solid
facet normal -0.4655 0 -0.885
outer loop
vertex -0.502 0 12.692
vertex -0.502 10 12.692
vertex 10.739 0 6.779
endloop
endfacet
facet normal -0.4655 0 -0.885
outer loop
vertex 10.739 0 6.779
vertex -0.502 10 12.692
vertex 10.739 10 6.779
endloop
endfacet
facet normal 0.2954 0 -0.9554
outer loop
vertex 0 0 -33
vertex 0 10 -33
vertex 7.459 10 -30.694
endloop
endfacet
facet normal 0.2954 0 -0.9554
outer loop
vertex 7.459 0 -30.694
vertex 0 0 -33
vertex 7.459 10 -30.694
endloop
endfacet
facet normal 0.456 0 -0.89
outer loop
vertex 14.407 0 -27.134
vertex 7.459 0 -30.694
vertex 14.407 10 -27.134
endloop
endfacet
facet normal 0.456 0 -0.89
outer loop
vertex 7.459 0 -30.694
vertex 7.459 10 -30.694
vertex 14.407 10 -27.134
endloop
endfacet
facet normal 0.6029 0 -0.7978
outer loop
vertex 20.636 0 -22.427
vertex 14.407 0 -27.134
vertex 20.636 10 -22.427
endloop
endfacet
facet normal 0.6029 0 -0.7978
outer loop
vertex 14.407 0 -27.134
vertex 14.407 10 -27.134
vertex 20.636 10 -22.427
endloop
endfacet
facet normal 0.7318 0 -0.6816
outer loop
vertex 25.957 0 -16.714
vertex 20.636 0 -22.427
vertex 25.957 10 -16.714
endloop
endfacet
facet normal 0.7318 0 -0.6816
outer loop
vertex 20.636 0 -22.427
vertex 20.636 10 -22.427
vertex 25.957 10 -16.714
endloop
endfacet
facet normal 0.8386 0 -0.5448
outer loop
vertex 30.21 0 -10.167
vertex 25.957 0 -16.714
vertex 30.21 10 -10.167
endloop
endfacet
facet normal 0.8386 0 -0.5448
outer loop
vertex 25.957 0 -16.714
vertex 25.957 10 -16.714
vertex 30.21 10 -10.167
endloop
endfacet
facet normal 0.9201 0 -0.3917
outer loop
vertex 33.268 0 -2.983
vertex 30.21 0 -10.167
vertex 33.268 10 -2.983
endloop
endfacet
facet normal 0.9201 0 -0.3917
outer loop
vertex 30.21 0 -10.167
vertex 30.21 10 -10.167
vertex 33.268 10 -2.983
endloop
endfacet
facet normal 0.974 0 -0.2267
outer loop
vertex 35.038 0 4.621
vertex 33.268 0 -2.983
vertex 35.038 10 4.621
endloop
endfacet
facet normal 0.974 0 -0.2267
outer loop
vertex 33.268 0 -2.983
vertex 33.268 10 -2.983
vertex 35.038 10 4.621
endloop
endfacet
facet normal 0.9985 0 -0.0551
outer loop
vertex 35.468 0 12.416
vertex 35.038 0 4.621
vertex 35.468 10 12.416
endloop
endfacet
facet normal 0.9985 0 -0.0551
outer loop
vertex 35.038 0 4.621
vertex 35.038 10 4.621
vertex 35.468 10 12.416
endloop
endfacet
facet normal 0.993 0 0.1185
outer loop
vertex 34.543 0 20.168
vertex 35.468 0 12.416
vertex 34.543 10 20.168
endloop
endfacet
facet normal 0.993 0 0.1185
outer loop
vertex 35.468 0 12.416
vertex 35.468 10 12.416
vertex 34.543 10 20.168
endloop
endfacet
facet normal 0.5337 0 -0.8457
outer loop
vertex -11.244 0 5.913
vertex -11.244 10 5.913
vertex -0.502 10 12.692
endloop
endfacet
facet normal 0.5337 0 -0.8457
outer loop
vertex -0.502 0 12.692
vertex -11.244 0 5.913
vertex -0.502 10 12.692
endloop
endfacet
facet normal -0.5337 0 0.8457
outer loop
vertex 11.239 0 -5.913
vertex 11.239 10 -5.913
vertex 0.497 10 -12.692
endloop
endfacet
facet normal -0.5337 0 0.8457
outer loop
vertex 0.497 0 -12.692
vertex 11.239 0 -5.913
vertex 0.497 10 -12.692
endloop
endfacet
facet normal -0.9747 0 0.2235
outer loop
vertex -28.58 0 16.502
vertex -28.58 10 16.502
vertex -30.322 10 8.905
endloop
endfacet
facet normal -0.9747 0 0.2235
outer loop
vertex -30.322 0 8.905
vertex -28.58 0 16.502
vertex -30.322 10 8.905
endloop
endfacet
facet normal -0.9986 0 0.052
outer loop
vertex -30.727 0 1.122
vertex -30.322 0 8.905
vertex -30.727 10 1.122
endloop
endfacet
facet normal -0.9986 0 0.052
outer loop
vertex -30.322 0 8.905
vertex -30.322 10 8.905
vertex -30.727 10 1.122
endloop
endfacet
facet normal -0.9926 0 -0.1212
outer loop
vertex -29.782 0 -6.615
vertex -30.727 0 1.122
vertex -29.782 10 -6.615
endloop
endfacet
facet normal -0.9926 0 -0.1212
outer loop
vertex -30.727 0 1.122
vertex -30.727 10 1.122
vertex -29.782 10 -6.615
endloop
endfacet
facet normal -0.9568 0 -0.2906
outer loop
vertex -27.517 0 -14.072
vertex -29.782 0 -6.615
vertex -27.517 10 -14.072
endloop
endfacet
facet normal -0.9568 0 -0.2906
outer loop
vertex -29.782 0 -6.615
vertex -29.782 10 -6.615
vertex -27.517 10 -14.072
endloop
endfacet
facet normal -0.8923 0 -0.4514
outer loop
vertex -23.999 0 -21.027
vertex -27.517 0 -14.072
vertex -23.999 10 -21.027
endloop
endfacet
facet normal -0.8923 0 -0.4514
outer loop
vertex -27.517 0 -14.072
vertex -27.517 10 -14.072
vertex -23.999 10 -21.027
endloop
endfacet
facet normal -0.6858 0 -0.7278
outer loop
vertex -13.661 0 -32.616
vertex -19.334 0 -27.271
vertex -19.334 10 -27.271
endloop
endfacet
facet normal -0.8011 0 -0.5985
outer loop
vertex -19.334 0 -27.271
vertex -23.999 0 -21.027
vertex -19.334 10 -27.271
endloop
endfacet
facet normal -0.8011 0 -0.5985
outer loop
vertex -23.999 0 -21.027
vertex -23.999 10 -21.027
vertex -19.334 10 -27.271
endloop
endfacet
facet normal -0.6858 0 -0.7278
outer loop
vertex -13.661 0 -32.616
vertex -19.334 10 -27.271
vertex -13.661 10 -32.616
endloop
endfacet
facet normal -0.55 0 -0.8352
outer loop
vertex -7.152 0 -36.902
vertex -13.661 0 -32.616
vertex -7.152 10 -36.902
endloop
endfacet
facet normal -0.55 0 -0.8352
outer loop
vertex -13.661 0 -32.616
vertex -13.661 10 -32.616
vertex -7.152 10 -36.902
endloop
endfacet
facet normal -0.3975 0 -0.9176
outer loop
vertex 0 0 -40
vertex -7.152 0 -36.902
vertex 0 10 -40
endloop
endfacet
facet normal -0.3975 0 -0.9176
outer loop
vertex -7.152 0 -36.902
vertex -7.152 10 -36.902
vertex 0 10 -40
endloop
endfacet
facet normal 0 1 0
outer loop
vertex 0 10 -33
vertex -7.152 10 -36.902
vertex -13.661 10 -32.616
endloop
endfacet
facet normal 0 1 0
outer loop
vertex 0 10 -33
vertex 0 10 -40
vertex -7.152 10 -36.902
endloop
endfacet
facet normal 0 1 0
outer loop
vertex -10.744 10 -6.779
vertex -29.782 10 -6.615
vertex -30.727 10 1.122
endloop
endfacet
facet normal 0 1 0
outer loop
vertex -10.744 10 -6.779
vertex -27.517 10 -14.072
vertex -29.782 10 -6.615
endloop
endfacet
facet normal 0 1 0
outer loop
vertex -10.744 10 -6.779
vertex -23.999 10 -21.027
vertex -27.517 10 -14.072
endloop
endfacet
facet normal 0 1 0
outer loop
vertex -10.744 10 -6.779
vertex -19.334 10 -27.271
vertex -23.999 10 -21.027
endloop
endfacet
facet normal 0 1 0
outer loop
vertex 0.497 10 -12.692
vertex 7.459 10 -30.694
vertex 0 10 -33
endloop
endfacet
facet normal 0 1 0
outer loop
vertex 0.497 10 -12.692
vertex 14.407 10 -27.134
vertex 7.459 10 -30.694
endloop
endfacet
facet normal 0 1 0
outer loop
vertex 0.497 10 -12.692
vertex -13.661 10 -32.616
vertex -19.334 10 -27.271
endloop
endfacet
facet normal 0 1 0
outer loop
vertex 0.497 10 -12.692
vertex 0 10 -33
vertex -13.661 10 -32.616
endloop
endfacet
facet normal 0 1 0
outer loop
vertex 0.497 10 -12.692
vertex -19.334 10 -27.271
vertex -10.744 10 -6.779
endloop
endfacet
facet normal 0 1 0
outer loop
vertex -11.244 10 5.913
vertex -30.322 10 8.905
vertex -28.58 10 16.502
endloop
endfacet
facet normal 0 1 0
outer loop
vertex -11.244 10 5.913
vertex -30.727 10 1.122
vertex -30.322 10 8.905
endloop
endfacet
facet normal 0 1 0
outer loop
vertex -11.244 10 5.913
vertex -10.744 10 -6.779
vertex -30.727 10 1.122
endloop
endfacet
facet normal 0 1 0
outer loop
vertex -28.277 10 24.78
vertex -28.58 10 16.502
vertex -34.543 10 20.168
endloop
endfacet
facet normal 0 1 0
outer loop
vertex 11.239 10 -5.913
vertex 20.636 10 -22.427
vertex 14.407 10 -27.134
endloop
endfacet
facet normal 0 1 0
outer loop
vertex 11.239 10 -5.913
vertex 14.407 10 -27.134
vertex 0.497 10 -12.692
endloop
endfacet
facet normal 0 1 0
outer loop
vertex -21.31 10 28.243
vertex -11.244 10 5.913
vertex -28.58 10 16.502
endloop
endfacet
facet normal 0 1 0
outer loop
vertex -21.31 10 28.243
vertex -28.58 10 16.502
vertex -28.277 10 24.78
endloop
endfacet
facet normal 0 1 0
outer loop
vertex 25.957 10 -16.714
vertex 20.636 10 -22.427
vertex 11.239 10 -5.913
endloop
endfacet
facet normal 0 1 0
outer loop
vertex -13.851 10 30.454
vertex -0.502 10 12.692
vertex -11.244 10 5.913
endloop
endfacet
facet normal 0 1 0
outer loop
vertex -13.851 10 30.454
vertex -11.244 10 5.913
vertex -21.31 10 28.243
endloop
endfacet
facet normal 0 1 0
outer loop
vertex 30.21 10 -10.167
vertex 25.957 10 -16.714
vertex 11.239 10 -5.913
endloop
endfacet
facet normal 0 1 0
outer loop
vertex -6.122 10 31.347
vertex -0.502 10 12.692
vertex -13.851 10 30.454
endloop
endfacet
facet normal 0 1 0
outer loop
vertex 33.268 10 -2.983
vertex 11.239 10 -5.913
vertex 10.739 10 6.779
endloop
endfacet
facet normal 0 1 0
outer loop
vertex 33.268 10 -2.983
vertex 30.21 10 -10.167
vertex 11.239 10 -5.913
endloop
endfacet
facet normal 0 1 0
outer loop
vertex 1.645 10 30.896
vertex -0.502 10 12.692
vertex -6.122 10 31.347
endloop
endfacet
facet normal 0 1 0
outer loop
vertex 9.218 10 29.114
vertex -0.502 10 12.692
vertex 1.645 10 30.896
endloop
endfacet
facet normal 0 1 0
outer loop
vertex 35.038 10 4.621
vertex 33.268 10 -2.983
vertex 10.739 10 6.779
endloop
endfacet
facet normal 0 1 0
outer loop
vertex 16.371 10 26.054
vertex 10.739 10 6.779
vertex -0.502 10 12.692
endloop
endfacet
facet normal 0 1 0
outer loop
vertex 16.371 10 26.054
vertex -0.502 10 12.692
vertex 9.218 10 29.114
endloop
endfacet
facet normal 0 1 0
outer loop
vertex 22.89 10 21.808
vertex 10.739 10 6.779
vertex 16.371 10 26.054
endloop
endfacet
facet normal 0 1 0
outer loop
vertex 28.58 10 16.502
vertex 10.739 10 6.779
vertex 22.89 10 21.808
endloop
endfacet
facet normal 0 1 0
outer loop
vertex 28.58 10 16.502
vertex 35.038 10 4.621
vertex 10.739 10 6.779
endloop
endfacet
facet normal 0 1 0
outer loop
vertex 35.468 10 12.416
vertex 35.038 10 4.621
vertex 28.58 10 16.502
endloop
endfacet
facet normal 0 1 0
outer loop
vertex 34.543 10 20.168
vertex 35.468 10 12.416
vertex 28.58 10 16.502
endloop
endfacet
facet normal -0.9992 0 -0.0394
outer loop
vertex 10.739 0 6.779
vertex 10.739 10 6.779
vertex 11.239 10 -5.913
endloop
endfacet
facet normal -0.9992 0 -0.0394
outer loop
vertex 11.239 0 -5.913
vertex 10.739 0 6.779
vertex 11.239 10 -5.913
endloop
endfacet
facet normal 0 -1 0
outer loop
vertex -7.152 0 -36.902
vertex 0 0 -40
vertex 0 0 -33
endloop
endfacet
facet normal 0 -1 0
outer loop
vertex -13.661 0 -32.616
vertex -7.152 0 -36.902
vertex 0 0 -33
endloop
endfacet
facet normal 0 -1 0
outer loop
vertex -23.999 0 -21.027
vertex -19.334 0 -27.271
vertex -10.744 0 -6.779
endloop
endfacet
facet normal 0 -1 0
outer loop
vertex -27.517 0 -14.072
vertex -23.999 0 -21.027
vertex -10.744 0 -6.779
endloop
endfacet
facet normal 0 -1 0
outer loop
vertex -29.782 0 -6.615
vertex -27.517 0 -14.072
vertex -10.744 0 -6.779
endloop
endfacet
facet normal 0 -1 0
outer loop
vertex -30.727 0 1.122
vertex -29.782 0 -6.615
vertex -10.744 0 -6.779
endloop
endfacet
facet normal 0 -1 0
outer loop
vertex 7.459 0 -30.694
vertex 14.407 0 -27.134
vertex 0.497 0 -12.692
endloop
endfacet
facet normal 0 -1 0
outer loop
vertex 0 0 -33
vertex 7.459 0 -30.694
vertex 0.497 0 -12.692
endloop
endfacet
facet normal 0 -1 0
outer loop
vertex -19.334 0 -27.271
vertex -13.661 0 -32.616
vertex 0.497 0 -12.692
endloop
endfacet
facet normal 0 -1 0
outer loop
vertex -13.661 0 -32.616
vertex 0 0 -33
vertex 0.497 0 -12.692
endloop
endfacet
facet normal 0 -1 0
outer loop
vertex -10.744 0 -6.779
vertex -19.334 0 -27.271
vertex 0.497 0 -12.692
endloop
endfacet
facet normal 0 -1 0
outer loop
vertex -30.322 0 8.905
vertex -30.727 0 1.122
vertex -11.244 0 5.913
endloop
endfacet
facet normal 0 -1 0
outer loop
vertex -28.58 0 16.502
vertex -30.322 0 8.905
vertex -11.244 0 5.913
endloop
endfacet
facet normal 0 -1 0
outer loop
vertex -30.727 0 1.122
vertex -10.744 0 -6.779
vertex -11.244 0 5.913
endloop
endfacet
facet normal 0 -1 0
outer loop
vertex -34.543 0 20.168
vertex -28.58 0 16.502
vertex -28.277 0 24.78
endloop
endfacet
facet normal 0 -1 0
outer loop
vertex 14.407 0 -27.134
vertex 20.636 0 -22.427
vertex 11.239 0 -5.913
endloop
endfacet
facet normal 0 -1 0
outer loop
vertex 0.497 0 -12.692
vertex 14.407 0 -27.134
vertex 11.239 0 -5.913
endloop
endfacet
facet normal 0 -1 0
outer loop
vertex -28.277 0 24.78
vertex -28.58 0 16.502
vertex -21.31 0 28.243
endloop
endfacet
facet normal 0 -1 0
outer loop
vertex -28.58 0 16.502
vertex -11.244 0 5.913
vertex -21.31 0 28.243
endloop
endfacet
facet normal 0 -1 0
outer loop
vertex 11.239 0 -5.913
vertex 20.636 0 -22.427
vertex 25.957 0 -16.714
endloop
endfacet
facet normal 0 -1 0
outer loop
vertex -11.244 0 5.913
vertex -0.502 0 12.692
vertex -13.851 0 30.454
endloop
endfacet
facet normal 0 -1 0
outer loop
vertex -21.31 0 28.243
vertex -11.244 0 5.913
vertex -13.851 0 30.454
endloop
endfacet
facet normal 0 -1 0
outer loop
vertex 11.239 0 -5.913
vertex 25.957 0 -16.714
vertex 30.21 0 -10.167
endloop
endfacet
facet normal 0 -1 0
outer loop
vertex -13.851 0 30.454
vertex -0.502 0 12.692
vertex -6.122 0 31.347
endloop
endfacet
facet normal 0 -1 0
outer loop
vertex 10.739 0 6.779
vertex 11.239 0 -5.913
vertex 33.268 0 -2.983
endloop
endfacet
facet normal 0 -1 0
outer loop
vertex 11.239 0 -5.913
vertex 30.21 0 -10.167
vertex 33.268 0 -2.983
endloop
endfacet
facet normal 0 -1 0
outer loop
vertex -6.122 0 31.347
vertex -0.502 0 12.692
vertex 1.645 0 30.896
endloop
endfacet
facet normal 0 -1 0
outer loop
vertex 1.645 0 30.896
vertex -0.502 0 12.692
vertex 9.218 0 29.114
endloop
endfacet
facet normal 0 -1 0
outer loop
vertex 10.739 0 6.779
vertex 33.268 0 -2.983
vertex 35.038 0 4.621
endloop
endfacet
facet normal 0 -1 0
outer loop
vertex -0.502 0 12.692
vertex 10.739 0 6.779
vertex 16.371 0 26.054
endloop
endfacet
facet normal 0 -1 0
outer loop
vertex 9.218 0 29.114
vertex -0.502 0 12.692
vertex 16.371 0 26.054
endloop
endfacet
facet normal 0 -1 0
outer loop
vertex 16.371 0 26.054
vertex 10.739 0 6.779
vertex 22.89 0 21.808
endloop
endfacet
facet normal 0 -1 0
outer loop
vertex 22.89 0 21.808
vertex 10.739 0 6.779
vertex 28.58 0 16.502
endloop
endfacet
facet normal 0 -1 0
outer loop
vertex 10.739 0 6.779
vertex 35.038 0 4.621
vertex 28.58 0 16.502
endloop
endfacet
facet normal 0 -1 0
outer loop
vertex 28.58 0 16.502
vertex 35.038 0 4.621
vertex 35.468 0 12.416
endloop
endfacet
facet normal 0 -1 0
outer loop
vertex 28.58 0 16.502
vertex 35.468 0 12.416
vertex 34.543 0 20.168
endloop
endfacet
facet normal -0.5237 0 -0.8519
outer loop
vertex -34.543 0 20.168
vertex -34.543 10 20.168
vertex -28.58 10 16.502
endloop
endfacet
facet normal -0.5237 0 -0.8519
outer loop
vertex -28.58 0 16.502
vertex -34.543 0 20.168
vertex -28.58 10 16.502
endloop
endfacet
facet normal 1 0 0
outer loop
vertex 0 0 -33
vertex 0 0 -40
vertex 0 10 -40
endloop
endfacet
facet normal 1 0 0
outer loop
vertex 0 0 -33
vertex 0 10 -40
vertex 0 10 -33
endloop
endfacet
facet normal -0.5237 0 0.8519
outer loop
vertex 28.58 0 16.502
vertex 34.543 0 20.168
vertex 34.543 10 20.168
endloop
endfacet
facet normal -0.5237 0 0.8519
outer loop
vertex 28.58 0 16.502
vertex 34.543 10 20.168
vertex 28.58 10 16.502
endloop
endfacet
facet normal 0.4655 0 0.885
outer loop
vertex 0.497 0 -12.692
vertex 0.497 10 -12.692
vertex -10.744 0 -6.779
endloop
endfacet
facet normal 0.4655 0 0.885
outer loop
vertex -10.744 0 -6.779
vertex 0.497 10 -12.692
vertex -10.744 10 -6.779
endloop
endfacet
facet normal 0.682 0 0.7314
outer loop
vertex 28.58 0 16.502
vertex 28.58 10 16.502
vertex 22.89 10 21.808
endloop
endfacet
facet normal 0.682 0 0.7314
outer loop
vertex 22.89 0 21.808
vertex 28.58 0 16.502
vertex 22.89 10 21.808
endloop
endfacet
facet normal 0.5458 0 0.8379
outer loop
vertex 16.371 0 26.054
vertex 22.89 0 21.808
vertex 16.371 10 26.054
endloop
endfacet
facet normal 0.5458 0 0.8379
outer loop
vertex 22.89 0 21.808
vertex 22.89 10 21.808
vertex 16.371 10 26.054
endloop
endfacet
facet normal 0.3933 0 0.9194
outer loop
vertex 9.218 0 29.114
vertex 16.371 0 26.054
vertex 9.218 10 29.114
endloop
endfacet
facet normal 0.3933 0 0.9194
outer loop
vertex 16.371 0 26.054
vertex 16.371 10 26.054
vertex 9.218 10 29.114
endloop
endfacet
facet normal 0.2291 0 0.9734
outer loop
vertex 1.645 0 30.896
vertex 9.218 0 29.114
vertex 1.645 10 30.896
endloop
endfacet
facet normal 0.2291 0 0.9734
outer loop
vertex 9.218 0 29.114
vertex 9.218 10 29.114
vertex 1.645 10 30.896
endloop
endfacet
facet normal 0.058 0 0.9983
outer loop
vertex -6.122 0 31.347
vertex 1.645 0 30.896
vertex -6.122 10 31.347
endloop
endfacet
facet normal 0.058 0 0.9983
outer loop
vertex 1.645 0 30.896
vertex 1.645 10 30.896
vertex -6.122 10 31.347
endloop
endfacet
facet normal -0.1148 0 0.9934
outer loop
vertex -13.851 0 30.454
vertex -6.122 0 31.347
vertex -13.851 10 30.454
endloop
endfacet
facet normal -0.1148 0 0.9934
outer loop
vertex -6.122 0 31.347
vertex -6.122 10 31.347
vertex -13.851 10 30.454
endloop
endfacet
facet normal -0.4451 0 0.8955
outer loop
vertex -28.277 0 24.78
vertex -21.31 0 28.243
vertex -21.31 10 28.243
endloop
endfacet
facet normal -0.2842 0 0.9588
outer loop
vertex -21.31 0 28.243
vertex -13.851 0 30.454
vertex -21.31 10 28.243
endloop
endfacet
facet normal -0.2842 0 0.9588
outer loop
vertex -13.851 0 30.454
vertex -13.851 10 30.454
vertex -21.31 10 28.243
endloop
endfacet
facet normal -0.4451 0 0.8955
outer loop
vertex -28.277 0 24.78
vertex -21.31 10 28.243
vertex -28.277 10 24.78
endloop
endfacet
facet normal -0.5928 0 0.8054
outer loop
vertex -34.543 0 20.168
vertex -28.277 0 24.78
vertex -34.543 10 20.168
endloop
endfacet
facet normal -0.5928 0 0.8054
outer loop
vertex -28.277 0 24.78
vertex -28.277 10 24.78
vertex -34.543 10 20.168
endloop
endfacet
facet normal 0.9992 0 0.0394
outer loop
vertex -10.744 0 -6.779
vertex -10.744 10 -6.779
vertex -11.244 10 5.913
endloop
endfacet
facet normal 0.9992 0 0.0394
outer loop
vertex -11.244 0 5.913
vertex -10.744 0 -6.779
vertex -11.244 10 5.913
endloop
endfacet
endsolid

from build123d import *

# Parameters (mm, degrees)
SKETCH1_R           = 40
BOSS_EXTRUDE1_DEPTH = 10
CUT_EXTRUDE1_REACH  = 59.446


with BuildPart() as part:
    # Sketch1 → Boss-Extrude1 (new body)
    with BuildSketch(Plane(origin=(0, 0, 0), x_dir=(1, 0, 0), z_dir=(0, 1, 0))):
        with Locations(Location((0, 0, 0), (0, 0, 270))):
            Circle(SKETCH1_R)
    extrude(amount=BOSS_EXTRUDE1_DEPTH)

    # Sketch2 → Cut-Extrude1 (cut, up to next)
    with BuildSketch(Plane(origin=(0, 10, 0), x_dir=(1, 0, 0), z_dir=(0, 1, 0)), mode=Mode.PRIVATE) as cut_extrude1_sk1:
        Polygon((11.238774325, 5.913221721), (0.497117057, 12.691874424), (-10.744197021, 6.778652704), (-11.243853833, -5.913221721), (-0.502196565, -12.691874424), (10.739117514, -6.778652704), align=None)
    cut_extrude1_tool1 = extrude(cut_extrude1_sk1.sketch, amount=-CUT_EXTRUDE1_REACH, mode=Mode.PRIVATE) & part.part
    # Sketch2 → Cut-Extrude1 (cut, up to next)
    with BuildSketch(Plane(origin=(0, 10, 0), x_dir=(1, 0, 0), z_dir=(0, 1, 0)), mode=Mode.PRIVATE) as cut_extrude1_sk2:
        with BuildLine():
            Line((34.543248704, -20.168390341), (28.580108202, -16.502199491))
            ThreePointArc((28.580108202, -16.502199491), (-2.229161984, -31.290031187), (-34.543248704, -20.168390341))
            ThreePointArc((-34.543248704, -20.168390341), (-19.915626859, -34.689592197), (0, -40))
            ThreePointArc((0, -40), (19.915626859, -34.689592197), (34.543248704, -20.168390341))
        make_face()
    cut_extrude1_tool2 = extrude(cut_extrude1_sk2.sketch, amount=-CUT_EXTRUDE1_REACH, mode=Mode.PRIVATE) & part.part
    # Sketch2 → Cut-Extrude1 (cut, up to next)
    with BuildSketch(Plane(origin=(0, 10, 0), x_dir=(1, 0, 0), z_dir=(0, 1, 0)), mode=Mode.PRIVATE) as cut_extrude1_sk3:
        with BuildLine():
            ThreePointArc((0, 33), (28.225744016, 13.532643941), (34.543248704, -20.168390341))
            ThreePointArc((34.543248704, -20.168390341), (34.689592197, 19.915626859), (0, 40))
            Line((0, 40), (0, 33))
        make_face()
    cut_extrude1_tool3 = extrude(cut_extrude1_sk3.sketch, amount=-CUT_EXTRUDE1_REACH, mode=Mode.PRIVATE) & part.part
    # Sketch2 → Cut-Extrude1 (cut, up to next)
    with BuildSketch(Plane(origin=(0, 10, 0), x_dir=(1, 0, 0), z_dir=(0, 1, 0)), mode=Mode.PRIVATE) as cut_extrude1_sk4:
        with BuildLine():
            ThreePointArc((0, 40), (-34.689592197, 19.915626859), (-34.543248704, -20.168390341))
            Line((-34.543248704, -20.168390341), (-28.580108202, -16.502199491))
            ThreePointArc((-28.580108202, -16.502199491), (-25.909016553, 17.626037907), (0, 40))
        make_face()
    cut_extrude1_tool4 = extrude(cut_extrude1_sk4.sketch, amount=-CUT_EXTRUDE1_REACH, mode=Mode.PRIVATE) & part.part
    add(cut_extrude1_tool1.solids().sort_by_distance((-0.00254, 10, 0))[0], mode=Mode.SUBTRACT)
    add(cut_extrude1_tool2.solids().sort_by_distance((5.104004, 10, 31.071916))[0], mode=Mode.SUBTRACT)
    add(cut_extrude1_tool3.solids().sort_by_distance((24.380546, 10, -19.814078))[0], mode=Mode.SUBTRACT)
    add(cut_extrude1_tool4.solids().sort_by_distance((-29.411799, 10, -11.104167))[0], mode=Mode.SUBTRACT)


solid = part.part
